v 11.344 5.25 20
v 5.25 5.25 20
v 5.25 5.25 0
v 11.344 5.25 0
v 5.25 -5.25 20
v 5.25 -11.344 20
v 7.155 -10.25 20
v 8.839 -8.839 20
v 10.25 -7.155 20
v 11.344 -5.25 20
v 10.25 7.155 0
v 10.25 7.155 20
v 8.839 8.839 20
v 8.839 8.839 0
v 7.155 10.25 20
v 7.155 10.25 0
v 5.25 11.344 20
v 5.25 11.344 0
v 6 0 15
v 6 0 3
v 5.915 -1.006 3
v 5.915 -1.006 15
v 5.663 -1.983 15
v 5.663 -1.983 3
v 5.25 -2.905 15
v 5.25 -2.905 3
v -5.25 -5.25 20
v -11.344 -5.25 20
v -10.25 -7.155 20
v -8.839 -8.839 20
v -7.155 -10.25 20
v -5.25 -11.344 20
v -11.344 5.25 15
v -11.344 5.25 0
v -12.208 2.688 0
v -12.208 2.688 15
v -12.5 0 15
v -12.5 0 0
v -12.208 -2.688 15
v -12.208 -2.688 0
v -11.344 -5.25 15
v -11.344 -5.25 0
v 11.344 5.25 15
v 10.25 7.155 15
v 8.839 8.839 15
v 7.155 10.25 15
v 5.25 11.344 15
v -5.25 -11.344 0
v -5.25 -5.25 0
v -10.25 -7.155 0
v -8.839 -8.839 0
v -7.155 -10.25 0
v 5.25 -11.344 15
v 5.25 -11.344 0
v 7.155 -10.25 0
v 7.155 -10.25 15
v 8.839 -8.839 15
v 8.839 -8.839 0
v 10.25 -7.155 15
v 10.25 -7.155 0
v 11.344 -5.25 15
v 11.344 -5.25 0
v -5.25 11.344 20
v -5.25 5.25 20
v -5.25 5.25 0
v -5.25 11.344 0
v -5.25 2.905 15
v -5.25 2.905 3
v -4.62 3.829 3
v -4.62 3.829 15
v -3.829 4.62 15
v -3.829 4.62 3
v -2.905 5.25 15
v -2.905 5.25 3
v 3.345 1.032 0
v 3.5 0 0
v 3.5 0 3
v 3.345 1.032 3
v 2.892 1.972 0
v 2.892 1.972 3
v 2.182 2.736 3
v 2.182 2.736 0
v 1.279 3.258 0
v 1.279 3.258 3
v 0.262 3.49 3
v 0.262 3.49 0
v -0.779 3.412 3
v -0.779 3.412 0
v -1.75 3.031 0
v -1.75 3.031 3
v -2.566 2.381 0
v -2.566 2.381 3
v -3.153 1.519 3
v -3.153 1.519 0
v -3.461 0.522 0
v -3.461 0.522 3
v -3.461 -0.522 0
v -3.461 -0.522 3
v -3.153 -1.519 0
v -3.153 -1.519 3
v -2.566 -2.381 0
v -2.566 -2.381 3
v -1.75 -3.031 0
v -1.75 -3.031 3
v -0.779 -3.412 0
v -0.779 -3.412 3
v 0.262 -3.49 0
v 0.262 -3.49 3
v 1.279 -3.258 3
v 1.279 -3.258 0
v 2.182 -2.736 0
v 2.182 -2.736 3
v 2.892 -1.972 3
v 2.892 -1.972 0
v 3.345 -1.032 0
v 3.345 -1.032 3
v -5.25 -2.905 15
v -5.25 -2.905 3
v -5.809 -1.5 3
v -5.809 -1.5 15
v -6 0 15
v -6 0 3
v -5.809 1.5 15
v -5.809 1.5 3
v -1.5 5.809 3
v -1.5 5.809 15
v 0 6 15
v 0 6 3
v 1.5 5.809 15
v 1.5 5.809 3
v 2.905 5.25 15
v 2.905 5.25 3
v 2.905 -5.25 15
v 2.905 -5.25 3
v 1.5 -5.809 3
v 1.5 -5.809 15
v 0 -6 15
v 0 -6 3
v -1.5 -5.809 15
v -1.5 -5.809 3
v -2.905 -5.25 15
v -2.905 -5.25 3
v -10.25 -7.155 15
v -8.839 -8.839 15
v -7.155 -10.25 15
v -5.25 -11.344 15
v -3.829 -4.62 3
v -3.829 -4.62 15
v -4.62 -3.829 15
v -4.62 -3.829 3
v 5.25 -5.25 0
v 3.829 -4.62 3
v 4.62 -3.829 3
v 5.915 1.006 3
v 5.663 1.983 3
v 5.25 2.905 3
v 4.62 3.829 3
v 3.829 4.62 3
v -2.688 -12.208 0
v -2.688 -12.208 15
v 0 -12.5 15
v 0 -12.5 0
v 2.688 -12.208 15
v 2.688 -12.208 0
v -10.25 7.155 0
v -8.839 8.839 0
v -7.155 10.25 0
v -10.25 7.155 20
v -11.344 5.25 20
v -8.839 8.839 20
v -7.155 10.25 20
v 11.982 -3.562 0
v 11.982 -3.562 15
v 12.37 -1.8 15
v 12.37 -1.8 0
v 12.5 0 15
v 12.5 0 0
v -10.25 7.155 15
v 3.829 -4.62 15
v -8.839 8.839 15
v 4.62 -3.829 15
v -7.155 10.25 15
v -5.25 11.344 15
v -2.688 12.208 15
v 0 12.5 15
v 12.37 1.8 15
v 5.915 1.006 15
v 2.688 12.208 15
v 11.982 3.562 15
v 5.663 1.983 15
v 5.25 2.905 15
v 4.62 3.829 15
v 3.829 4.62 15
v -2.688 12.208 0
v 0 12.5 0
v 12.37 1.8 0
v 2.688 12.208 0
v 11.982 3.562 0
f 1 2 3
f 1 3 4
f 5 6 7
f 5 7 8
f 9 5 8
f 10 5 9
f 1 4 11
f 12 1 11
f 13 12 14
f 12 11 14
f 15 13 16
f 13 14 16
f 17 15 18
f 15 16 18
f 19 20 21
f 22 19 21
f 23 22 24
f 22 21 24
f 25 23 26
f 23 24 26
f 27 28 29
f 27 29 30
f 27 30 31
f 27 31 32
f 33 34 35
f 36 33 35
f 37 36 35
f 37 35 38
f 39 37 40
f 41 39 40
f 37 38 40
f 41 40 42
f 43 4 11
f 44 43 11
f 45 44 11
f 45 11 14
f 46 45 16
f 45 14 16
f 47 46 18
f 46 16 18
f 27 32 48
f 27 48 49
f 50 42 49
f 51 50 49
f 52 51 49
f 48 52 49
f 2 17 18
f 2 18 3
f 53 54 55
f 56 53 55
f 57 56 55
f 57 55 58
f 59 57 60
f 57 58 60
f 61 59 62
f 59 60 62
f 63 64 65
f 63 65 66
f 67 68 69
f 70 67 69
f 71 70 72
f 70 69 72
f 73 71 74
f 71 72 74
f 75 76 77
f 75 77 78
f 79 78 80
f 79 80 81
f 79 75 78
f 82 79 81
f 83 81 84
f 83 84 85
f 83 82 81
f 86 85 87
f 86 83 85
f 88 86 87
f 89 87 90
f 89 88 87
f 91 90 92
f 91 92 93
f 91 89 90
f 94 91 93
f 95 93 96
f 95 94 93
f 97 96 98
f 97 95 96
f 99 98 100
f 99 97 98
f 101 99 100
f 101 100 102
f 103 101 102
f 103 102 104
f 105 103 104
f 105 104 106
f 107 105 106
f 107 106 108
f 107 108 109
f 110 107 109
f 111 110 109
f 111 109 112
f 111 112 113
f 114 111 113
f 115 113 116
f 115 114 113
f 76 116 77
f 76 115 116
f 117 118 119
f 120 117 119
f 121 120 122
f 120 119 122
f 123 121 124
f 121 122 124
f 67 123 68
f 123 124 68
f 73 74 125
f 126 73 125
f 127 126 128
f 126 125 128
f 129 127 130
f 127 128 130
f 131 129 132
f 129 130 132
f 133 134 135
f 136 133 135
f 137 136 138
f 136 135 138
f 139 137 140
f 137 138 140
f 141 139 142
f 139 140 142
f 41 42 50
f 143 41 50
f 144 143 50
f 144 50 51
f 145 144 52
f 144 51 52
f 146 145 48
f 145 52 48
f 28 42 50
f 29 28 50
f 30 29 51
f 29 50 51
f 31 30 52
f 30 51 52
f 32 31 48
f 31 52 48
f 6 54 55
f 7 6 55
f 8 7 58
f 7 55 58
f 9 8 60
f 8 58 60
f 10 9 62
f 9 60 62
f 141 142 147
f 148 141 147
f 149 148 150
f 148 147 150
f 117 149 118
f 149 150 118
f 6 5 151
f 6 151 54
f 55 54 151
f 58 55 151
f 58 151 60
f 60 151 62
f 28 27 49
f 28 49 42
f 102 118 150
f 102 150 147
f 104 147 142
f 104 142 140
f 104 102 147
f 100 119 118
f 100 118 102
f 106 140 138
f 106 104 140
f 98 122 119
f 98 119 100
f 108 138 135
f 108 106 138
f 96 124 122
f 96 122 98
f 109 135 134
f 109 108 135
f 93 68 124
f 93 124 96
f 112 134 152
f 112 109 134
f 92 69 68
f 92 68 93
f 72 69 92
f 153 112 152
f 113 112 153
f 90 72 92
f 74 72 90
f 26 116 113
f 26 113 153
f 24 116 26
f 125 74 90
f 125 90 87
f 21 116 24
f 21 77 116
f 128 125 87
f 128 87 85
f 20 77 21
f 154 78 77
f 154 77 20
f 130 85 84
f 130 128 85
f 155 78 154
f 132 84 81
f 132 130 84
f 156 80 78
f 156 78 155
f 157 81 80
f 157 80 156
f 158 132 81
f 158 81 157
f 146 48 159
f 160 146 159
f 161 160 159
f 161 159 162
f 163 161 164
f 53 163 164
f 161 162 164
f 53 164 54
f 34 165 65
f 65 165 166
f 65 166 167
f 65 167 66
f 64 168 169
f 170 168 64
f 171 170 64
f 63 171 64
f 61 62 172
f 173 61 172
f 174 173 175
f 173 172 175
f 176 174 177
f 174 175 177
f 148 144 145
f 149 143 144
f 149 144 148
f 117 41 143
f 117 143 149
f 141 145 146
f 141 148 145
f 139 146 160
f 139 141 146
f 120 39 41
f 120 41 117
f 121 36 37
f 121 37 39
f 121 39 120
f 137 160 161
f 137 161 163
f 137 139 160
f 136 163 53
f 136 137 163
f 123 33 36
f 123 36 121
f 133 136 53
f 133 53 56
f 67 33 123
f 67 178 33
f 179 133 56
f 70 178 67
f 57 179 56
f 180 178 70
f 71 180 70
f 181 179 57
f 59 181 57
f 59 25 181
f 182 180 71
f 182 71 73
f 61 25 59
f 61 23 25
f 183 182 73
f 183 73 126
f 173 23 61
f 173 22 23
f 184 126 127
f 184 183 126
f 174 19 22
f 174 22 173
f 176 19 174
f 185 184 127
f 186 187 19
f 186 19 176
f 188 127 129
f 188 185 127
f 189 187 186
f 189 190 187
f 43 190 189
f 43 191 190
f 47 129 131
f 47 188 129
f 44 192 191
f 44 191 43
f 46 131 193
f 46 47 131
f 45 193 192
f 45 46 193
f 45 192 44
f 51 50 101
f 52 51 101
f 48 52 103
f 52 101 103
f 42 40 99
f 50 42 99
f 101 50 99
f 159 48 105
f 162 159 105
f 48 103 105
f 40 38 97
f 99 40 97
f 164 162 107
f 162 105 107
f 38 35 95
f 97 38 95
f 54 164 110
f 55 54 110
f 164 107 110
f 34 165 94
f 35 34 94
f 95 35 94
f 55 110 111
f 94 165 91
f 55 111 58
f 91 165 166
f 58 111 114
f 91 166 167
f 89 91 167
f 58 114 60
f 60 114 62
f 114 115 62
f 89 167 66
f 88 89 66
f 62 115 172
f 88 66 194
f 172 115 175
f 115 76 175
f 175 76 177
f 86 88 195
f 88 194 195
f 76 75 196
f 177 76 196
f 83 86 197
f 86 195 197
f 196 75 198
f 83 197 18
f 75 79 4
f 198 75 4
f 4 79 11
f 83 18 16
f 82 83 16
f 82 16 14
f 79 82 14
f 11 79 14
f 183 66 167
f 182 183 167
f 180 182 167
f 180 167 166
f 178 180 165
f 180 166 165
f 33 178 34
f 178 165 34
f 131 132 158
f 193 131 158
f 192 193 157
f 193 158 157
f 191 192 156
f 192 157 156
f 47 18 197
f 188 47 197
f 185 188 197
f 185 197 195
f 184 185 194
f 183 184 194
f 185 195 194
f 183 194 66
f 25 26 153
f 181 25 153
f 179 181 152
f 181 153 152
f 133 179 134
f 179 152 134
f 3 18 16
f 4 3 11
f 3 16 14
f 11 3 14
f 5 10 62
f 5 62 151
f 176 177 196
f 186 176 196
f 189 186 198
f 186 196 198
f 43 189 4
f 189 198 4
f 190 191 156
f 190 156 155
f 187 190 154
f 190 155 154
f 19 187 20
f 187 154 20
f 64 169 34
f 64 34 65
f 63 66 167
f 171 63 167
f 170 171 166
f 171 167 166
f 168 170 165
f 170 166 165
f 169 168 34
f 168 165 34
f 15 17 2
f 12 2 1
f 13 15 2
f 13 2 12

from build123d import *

# Parameters (mm, degrees)
F1_DEPTH = 15
F2_DEPTH = 20
F0_R     = 3.5
F3_DEPTH = 3


with BuildPart() as f1:
    # F0 (on Top) → F1 (new body)
    with BuildSketch(Plane.XY):
        with BuildLine():
            Line((5.25, 5.25), (11.3440513045, 5.25))
            ThreePointArc((11.3440513045, 5.25), (8.8388347648, 8.8388347648), (5.25, 11.3440513045))
            Line((5.25, 11.3440513045), (5.25, 5.25))
        make_face()
        with BuildLine():
            Line((5.25, 5.25), (5.25, 11.3440513045))
            ThreePointArc((5.25, 11.3440513045), (0, 12.5), (-5.25, 11.3440513045))
            Line((-5.25, 11.3440513045), (-5.25, 5.25))
            Line((-5.25, 5.25), (-2.9047375097, 5.25))
            ThreePointArc((-2.9047375097, 5.25), (0, 6), (2.9047375097, 5.25))
            Line((2.9047375097, 5.25), (5.25, 5.25))
        make_face()
        with BuildLine():
            Line((-5.25, 5.25), (-5.25, 11.3440513045))
            ThreePointArc((-5.25, 11.3440513045), (-8.8388347648, 8.8388347648), (-11.3440513045, 5.25))
            Line((-11.3440513045, 5.25), (-5.25, 5.25))
        make_face()
        with BuildLine():
            Line((-5.25, 5.25), (-11.3440513045, 5.25))
            ThreePointArc((-11.3440513045, 5.25), (-12.5, 0), (-11.3440513045, -5.25))
            Line((-11.3440513045, -5.25), (-5.25, -5.25))
            Line((-5.25, -5.25), (-5.25, -2.9047375097))
            ThreePointArc((-5.25, -2.9047375097), (-6, 0), (-5.25, 2.9047375097))
            Line((-5.25, 2.9047375097), (-5.25, 5.25))
        make_face()
        with BuildLine():
            ThreePointArc((-11.3440513045, -5.25), (-8.8388347648, -8.8388347648), (-5.25, -11.3440513045))
            Line((-5.25, -11.3440513045), (-5.25, -5.25))
            Line((-5.25, -5.25), (-11.3440513045, -5.25))
        make_face()
        with BuildLine():
            ThreePointArc((-5.25, -11.3440513045), (0, -12.5), (5.25, -11.3440513045))
            Line((5.25, -11.3440513045), (5.25, -5.25))
            Line((5.25, -5.25), (2.9047375097, -5.25))
            ThreePointArc((2.9047375097, -5.25), (0, -6), (-2.9047375097, -5.25))
            Line((-2.9047375097, -5.25), (-5.25, -5.25))
            Line((-5.25, -5.25), (-5.25, -11.3440513045))
        make_face()
        with BuildLine():
            ThreePointArc((5.25, -11.3440513045), (8.8388347648, -8.8388347648), (11.3440513045, -5.25))
            Line((11.3440513045, -5.25), (5.25, -5.25))
            Line((5.25, -5.25), (5.25, -11.3440513045))
        make_face()
        with BuildLine():
            ThreePointArc((11.3440513045, -5.25), (12.207592746, -2.6878763637), (12.5, 0))
            ThreePointArc((12.5, 0), (12.207592746, 2.6878763637), (11.3440513045, 5.25))
            Line((11.3440513045, 5.25), (5.25, 5.25))
            Line((5.25, 5.25), (5.25, 2.9047375097))
            ThreePointArc((5.25, 2.9047375097), (5.8094750193, 1.5), (6, 0))
            ThreePointArc((6, 0), (5.8094750193, -1.5), (5.25, -2.9047375097))
            Line((5.25, -2.9047375097), (5.25, -5.25))
            Line((5.25, -5.25), (11.3440513045, -5.25))
        make_face()
        with BuildLine():
            Line((5.25, 2.9047375097), (5.25, 5.25))
            Line((5.25, 5.25), (2.9047375097, 5.25))
            ThreePointArc((2.9047375097, 5.25), (4.2426406871, 4.2426406871), (5.25, 2.9047375097))
        make_face()
        with BuildLine():
            Line((-2.9047375097, 5.25), (-5.25, 5.25))
            Line((-5.25, 5.25), (-5.25, 2.9047375097))
            ThreePointArc((-5.25, 2.9047375097), (-4.2426406871, 4.2426406871), (-2.9047375097, 5.25))
        make_face()
        with BuildLine():
            Line((-5.25, -2.9047375097), (-5.25, -5.25))
            Line((-5.25, -5.25), (-2.9047375097, -5.25))
            ThreePointArc((-2.9047375097, -5.25), (-4.2426406871, -4.2426406871), (-5.25, -2.9047375097))
        make_face()
        with BuildLine():
            Line((2.9047375097, -5.25), (5.25, -5.25))
            Line((5.25, -5.25), (5.25, -2.9047375097))
            ThreePointArc((5.25, -2.9047375097), (4.2426406871, -4.2426406871), (2.9047375097, -5.25))
        make_face()
    extrude(amount=F1_DEPTH)

    # F0 (on Top) → F3 (join)
    with BuildSketch(Plane.XY):
        with BuildLine():
            Line((5.25, -2.9047375097), (5.25, 2.9047375097))
            ThreePointArc((5.25, 2.9047375097), (4.2426406871, 4.2426406871), (2.9047375097, 5.25))
            Line((2.9047375097, 5.25), (-2.9047375097, 5.25))
            ThreePointArc((-2.9047375097, 5.25), (-4.2426406871, 4.2426406871), (-5.25, 2.9047375097))
            Line((-5.25, 2.9047375097), (-5.25, -2.9047375097))
            ThreePointArc((-5.25, -2.9047375097), (-4.2426406871, -4.2426406871), (-2.9047375097, -5.25))
            Line((-2.9047375097, -5.25), (2.9047375097, -5.25))
            ThreePointArc((2.9047375097, -5.25), (4.2426406871, -4.2426406871), (5.25, -2.9047375097))
        make_face()
        Circle(F0_R, mode=Mode.SUBTRACT)
        with BuildLine():
            Line((-2.9047375097, 5.25), (2.9047375097, 5.25))
            ThreePointArc((2.9047375097, 5.25), (0, 6), (-2.9047375097, 5.25))
        make_face()
        with BuildLine():
            Line((-5.25, -2.9047375097), (-5.25, 2.9047375097))
            ThreePointArc((-5.25, 2.9047375097), (-6, 0), (-5.25, -2.9047375097))
        make_face()
        with BuildLine():
            ThreePointArc((-2.9047375097, -5.25), (0, -6), (2.9047375097, -5.25))
            Line((2.9047375097, -5.25), (-2.9047375097, -5.25))
        make_face()
        with BuildLine():
            ThreePointArc((6, 0), (5.8094750193, 1.5), (5.25, 2.9047375097))
            Line((5.25, 2.9047375097), (5.25, -2.9047375097))
            ThreePointArc((5.25, -2.9047375097), (5.8094750193, -1.5), (6, 0))
        make_face()
    extrude(amount=F3_DEPTH)


with BuildPart() as f2:
    # F0 (on Top) → F2 (new body)
    with BuildSketch(Plane.XY):
        with BuildLine():
            Line((5.25, 5.25), (11.3440513045, 5.25))
            ThreePointArc((11.3440513045, 5.25), (8.8388347648, 8.8388347648), (5.25, 11.3440513045))
            Line((5.25, 11.3440513045), (5.25, 5.25))
        make_face()
    extrude(amount=F2_DEPTH)


with BuildPart() as f2b:
    # F0 (on Top) → F2, piece 2 (new body)
    with BuildSketch(Plane.XY):
        with BuildLine():
            ThreePointArc((5.25, -11.3440513045), (8.8388347648, -8.8388347648), (11.3440513045, -5.25))
            Line((11.3440513045, -5.25), (5.25, -5.25))
            Line((5.25, -5.25), (5.25, -11.3440513045))
        make_face()
    extrude(amount=F2_DEPTH)


with BuildPart() as f2c:
    # F0 (on Top) → F2, piece 3 (new body)
    with BuildSketch(Plane.XY):
        with BuildLine():
            Line((-5.25, 5.25), (-5.25, 11.3440513045))
            ThreePointArc((-5.25, 11.3440513045), (-8.8388347648, 8.8388347648), (-11.3440513045, 5.25))
            Line((-11.3440513045, 5.25), (-5.25, 5.25))
        make_face()
    extrude(amount=F2_DEPTH)


with BuildPart() as f2d:
    # F0 (on Top) → F2, piece 4 (new body)
    with BuildSketch(Plane.XY):
        with BuildLine():
            ThreePointArc((-11.3440513045, -5.25), (-8.8388347648, -8.8388347648), (-5.25, -11.3440513045))
            Line((-5.25, -11.3440513045), (-5.25, -5.25))
            Line((-5.25, -5.25), (-11.3440513045, -5.25))
        make_face()
    extrude(amount=F2_DEPTH)


solid = Compound([f1.part, f2.part, f2b.part, f2c.part, f2d.part])
